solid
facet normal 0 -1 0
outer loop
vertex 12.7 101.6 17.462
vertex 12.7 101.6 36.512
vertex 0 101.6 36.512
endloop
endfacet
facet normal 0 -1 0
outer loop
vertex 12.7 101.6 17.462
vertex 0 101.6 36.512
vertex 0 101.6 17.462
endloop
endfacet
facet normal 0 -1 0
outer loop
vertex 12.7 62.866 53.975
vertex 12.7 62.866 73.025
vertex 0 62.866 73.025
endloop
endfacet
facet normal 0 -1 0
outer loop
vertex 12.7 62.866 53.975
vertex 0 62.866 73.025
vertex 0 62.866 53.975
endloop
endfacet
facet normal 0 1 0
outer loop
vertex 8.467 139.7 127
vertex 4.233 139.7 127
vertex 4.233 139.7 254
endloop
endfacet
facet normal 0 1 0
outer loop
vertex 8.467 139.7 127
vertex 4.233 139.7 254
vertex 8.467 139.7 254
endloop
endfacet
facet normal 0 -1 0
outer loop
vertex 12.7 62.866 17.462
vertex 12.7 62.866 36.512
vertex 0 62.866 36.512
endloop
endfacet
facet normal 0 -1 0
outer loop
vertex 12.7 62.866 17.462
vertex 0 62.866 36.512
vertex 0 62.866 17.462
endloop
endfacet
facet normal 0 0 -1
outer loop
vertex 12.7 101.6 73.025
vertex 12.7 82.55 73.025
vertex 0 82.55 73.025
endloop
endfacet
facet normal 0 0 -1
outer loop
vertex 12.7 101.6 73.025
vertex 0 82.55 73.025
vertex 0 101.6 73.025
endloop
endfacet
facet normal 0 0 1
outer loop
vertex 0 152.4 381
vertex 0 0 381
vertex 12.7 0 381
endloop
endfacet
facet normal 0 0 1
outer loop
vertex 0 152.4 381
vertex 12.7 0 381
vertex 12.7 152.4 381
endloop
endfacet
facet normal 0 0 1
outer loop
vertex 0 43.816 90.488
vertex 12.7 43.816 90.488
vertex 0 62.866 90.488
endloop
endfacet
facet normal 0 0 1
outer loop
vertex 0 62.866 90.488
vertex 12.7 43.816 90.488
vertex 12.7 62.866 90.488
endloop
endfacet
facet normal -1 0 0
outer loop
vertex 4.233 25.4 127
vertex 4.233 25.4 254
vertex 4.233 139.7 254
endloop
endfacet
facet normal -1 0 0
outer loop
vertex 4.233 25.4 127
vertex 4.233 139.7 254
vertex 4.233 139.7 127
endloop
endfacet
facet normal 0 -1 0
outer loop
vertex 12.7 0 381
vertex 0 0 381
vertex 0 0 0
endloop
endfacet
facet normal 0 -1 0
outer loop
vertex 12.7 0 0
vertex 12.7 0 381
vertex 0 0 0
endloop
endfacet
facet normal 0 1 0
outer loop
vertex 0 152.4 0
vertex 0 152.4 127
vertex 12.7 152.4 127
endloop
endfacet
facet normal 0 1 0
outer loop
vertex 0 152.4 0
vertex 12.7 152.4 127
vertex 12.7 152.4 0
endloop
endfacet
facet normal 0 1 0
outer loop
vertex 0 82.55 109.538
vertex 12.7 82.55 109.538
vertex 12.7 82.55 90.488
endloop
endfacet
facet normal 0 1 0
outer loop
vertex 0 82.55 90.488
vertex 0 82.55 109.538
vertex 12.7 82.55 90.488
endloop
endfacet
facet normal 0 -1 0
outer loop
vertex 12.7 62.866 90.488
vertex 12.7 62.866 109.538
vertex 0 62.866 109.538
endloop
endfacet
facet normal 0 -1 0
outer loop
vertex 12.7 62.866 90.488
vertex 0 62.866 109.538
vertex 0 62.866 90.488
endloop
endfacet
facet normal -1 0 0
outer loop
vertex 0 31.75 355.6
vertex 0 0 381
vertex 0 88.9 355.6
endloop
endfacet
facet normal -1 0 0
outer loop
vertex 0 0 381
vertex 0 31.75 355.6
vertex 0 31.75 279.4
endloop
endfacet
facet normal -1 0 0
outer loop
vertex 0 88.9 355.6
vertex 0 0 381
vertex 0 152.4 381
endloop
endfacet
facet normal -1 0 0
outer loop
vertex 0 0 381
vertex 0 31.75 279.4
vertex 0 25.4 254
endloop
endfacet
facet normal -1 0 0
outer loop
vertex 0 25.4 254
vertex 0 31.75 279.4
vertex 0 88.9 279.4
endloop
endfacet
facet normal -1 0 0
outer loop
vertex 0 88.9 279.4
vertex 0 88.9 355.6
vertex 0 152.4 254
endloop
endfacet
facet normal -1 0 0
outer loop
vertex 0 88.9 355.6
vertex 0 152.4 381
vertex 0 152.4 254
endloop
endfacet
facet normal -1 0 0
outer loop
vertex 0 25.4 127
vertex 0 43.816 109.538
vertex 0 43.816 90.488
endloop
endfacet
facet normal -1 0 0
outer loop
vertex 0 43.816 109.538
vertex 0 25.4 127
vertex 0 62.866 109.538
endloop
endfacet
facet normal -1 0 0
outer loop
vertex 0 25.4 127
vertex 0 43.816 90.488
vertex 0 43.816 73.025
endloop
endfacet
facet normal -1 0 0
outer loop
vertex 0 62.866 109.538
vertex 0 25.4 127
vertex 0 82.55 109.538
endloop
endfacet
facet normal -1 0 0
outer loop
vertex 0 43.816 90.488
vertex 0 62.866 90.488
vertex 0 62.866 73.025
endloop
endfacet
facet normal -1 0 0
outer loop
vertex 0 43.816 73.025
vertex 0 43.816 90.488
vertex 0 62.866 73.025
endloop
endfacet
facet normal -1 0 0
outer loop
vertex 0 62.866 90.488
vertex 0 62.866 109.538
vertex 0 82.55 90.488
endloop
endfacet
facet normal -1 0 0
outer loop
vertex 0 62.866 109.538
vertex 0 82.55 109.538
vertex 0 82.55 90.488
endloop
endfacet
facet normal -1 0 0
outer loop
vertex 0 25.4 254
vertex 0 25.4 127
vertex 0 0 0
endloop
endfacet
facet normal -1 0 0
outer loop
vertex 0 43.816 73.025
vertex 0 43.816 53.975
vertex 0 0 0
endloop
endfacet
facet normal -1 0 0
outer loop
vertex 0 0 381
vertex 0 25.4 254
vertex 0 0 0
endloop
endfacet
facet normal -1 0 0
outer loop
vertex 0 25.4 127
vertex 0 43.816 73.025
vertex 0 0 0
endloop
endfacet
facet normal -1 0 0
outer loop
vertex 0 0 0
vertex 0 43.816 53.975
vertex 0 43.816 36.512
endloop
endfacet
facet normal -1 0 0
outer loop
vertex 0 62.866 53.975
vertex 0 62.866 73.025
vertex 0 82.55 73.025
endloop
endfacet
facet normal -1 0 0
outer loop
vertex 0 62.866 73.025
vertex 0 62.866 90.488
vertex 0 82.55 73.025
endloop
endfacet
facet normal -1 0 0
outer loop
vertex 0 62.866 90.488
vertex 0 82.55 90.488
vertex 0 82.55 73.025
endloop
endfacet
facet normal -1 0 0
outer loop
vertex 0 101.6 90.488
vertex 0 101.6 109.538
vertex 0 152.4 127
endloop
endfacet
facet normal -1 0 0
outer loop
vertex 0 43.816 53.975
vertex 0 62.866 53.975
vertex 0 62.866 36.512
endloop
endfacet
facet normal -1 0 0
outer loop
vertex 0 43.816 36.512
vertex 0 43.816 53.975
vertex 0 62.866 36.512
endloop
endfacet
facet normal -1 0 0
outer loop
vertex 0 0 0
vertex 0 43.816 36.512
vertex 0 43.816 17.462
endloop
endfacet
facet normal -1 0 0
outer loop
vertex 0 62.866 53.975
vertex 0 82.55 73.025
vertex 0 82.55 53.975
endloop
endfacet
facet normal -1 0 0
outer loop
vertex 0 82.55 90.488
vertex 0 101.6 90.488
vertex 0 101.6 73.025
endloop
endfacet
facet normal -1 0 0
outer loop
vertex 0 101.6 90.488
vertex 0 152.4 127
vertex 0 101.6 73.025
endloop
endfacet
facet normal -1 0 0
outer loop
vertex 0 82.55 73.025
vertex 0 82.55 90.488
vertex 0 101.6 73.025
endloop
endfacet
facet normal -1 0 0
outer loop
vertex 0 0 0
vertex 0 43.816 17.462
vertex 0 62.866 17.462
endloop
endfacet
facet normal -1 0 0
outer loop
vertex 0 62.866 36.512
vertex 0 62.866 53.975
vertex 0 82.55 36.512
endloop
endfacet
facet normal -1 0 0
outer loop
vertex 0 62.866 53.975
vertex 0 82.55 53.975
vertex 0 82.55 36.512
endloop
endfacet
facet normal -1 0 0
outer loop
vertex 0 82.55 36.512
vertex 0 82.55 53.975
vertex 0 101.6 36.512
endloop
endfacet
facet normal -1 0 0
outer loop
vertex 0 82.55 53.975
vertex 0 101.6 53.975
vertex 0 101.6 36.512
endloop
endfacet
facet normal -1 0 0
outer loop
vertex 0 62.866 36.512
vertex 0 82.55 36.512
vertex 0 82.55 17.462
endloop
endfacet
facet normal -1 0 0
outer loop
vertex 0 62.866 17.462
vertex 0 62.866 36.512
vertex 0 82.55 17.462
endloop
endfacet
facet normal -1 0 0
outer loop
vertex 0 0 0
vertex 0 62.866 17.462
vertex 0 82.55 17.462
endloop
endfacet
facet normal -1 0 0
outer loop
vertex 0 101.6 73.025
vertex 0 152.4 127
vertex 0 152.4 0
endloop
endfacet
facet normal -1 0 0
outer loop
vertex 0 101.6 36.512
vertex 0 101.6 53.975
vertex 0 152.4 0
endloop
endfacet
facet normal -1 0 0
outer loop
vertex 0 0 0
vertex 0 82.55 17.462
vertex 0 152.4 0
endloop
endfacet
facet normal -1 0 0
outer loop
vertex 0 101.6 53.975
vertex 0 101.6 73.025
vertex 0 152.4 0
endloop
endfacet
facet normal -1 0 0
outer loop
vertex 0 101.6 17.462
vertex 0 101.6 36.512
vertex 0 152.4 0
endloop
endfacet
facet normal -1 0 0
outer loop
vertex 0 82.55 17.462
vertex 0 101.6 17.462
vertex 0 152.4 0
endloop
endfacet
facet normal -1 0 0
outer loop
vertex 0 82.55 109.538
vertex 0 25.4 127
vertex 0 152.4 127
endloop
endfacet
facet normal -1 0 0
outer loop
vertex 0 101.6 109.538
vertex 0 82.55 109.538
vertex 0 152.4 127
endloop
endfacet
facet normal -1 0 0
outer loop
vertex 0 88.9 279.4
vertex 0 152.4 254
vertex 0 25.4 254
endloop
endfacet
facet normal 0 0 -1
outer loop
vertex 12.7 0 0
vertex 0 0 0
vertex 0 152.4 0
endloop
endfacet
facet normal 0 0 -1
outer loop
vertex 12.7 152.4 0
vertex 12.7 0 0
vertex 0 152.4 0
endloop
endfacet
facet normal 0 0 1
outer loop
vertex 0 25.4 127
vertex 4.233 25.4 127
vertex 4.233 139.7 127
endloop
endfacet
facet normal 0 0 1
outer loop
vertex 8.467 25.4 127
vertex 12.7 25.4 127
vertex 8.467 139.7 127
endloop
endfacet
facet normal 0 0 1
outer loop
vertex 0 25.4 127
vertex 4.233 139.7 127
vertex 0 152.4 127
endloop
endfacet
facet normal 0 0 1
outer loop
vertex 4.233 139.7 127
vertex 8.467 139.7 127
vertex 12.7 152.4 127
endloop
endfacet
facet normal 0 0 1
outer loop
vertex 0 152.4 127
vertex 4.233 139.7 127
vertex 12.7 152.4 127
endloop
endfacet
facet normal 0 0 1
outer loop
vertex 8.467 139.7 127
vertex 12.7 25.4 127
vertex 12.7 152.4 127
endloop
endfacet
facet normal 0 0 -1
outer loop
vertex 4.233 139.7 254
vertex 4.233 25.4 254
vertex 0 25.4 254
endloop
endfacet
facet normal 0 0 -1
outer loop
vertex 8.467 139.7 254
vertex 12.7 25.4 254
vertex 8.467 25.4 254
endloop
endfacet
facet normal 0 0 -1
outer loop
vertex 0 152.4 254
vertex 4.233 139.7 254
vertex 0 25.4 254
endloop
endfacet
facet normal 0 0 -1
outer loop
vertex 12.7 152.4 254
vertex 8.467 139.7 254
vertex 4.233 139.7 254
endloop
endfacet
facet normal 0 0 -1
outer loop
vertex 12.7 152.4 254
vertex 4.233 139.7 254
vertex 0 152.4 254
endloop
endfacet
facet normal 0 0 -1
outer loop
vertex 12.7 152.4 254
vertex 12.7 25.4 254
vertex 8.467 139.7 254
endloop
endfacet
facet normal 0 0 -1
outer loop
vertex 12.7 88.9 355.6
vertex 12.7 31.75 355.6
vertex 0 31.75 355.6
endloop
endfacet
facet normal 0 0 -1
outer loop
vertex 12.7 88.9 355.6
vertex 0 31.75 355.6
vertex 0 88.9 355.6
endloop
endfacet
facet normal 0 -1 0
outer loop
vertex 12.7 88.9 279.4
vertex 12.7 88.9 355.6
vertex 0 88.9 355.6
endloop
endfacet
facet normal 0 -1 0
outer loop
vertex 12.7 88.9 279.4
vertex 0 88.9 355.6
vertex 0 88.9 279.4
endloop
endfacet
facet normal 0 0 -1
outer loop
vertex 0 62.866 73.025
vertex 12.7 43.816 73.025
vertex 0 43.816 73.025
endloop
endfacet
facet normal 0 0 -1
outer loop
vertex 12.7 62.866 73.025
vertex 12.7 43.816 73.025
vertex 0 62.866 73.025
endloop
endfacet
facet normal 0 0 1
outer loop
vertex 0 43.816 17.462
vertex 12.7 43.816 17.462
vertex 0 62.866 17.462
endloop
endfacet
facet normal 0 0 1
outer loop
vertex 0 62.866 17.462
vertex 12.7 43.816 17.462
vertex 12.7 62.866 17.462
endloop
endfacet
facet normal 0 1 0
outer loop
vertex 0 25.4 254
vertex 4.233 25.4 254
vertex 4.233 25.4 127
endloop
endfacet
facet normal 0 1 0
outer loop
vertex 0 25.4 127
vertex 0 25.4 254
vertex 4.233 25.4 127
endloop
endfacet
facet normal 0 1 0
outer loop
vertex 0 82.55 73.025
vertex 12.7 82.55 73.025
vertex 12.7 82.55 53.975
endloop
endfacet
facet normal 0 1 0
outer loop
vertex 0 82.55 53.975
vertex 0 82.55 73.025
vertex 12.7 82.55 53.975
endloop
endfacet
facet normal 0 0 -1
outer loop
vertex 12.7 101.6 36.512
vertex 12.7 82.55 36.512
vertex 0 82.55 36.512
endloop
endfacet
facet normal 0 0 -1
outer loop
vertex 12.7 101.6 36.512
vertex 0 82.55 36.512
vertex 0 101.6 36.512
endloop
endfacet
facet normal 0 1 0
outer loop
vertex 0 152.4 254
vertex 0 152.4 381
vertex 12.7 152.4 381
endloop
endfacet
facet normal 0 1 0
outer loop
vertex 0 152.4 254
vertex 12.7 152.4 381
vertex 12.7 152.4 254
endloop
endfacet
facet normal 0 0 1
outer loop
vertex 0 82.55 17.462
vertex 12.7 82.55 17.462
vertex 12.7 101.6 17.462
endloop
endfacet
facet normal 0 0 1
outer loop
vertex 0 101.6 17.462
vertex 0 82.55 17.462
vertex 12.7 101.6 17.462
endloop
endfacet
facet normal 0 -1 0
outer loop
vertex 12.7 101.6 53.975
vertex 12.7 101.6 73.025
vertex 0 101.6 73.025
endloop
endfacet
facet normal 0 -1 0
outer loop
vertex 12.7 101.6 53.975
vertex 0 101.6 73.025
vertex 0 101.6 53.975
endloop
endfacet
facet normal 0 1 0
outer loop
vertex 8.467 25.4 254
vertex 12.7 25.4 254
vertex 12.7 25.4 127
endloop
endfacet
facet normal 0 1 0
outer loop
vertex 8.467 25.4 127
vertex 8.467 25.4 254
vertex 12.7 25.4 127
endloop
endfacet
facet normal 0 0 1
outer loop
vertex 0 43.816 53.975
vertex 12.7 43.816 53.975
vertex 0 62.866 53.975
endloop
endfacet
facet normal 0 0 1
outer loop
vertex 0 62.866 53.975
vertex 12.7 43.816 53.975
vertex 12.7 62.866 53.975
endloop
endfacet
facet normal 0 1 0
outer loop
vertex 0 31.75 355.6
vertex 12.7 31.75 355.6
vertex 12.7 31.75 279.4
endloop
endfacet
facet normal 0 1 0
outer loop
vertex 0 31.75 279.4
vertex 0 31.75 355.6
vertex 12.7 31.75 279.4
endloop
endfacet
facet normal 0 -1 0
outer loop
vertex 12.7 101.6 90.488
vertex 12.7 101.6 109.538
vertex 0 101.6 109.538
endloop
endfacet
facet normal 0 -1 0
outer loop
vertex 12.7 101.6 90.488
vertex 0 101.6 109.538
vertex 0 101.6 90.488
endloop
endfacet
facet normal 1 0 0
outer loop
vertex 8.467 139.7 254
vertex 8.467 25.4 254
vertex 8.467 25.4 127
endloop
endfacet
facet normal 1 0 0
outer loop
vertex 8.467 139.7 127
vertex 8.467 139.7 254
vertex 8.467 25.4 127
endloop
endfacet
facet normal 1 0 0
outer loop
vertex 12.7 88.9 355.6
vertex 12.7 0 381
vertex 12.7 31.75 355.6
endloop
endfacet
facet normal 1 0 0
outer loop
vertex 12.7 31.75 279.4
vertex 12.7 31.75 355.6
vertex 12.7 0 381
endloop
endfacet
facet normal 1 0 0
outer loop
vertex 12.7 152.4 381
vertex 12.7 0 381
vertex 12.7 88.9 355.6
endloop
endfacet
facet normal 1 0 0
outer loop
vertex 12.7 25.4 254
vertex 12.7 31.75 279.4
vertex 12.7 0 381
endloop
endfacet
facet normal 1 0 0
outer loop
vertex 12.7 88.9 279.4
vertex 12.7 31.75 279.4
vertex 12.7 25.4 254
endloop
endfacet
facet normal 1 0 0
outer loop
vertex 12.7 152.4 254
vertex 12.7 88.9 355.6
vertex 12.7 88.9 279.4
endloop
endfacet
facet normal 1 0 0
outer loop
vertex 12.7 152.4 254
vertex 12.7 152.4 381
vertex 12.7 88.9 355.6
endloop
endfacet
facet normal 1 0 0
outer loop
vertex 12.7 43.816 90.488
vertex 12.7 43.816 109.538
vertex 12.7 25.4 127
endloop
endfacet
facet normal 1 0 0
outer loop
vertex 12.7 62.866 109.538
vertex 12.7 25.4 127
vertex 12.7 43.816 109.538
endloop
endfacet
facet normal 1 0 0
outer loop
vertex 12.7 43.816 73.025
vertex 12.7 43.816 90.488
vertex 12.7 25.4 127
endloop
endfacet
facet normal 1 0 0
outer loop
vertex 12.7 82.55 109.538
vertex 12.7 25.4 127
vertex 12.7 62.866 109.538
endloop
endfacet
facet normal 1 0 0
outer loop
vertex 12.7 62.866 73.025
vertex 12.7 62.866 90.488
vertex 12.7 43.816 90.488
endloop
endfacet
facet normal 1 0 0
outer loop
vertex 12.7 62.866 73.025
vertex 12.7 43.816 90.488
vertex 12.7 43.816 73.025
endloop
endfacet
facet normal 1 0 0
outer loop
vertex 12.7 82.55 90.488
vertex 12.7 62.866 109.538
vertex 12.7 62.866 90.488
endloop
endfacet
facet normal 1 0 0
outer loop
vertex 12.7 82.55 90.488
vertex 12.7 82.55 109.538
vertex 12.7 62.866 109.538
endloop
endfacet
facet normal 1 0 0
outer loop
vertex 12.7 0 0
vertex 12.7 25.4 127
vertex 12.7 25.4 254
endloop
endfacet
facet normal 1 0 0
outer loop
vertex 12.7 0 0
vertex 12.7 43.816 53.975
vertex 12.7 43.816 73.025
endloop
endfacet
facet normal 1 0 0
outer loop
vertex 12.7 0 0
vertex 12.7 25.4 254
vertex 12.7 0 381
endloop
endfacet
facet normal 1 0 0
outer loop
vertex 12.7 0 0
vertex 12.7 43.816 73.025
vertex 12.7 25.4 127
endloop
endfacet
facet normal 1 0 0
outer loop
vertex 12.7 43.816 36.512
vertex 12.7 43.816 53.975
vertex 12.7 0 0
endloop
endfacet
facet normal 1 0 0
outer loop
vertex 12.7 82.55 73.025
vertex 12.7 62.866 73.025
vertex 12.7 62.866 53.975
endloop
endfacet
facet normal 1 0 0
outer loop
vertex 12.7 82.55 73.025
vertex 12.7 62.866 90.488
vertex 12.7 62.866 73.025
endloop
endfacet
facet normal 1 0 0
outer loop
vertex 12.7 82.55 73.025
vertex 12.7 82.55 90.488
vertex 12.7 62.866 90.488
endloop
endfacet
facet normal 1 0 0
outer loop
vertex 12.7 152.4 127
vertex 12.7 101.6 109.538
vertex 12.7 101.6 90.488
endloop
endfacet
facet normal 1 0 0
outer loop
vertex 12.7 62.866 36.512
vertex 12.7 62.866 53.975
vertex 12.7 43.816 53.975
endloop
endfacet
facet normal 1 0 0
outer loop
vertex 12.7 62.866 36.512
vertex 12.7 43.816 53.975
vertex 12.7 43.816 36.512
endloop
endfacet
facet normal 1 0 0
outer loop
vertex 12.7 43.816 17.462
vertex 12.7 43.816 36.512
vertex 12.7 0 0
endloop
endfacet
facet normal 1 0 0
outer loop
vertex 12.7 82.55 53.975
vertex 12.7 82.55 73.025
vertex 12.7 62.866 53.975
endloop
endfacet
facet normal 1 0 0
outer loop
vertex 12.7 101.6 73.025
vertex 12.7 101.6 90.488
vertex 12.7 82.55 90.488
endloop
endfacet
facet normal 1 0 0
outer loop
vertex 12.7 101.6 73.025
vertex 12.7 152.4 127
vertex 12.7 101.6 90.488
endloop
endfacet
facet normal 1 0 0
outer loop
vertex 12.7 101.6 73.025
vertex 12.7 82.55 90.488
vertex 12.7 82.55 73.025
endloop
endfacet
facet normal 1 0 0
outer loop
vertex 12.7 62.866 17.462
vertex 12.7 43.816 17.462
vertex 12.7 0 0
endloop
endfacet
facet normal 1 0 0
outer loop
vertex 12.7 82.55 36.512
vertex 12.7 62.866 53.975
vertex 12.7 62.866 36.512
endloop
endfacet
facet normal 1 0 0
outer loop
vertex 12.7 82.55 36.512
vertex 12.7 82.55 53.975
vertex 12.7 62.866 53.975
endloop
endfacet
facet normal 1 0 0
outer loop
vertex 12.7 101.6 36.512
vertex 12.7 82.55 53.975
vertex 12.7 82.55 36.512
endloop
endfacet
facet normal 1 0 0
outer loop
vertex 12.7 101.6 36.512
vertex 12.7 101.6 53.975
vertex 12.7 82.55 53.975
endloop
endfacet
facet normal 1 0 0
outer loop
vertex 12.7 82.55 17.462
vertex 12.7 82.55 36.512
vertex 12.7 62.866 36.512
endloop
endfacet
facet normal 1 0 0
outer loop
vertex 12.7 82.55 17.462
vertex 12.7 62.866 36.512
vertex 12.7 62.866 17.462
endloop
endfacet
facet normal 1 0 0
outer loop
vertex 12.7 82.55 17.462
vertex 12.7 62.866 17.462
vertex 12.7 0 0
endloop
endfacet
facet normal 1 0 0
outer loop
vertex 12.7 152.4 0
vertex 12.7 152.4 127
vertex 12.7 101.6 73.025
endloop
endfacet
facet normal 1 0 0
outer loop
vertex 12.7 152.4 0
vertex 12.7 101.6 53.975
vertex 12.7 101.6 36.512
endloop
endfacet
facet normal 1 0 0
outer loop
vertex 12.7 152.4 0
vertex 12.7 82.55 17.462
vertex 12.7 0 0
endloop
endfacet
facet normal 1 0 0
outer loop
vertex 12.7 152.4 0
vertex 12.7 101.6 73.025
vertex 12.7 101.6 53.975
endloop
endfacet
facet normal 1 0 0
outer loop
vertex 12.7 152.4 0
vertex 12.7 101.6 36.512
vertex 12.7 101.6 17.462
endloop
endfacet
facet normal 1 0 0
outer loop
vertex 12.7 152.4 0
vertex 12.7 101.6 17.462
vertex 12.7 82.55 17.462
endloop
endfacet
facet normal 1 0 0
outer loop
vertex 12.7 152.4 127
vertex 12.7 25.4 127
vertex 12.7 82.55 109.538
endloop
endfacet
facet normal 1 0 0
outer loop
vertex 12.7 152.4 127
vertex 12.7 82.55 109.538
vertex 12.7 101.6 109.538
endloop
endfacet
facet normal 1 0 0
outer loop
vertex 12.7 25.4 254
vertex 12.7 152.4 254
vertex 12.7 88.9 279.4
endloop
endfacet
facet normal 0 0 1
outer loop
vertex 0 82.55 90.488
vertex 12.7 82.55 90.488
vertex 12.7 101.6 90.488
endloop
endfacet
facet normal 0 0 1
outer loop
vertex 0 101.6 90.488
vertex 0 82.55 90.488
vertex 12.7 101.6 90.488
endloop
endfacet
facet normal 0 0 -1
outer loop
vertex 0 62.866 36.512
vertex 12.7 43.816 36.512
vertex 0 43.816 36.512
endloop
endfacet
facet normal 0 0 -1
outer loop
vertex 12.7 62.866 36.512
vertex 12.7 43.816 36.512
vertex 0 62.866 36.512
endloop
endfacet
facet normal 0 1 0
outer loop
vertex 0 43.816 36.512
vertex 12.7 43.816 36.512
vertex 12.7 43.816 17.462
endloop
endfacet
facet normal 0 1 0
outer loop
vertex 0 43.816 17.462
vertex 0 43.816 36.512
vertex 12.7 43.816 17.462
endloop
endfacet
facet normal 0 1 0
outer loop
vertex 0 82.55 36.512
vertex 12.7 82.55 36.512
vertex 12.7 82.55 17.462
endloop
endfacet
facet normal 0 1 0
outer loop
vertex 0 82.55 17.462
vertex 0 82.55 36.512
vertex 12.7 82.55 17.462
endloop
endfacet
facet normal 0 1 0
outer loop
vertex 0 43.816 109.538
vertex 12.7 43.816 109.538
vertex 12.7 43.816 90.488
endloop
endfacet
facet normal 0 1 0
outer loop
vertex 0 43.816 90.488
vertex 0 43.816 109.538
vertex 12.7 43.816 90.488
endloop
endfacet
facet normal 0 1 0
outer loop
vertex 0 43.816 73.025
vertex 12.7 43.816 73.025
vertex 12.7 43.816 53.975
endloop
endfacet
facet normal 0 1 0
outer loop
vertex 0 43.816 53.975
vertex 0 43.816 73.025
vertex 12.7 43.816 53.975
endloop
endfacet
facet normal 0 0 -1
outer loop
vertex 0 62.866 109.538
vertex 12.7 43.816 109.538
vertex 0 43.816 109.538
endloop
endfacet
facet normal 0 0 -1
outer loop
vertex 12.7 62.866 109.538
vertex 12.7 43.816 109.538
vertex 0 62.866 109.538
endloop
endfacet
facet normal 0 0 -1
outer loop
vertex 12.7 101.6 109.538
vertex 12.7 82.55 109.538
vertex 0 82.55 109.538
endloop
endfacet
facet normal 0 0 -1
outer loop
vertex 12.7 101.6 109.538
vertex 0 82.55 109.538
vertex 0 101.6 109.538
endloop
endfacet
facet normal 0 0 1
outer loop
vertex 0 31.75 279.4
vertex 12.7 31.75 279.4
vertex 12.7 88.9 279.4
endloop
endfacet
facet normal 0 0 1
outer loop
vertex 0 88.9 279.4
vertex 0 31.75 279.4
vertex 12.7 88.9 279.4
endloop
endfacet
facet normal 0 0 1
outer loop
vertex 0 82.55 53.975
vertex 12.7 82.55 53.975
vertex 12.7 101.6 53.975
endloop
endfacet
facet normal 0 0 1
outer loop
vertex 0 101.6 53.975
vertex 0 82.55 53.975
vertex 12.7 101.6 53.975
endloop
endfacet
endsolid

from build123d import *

# Parameters (mm, degrees)
SKETCH1_W           = 381
SKETCH1_H           = 152.4
BOSS_EXTRUDE2_DEPTH = 12.7
SKETCH2_W           = 127
SKETCH2_H           = 127
CUT_EXTRUDE1_DEPTH  = 12.7
SKETCH3_W           = 19.05
SKETCH3_H           = 19.05
SKETCH3_W_2         = 76.2
SKETCH3_H_2         = 57.15
CUT_EXTRUDE2_DEPTH  = 12.7
SKETCH4_W           = 4.233333334
SKETCH4_H           = 127
BOSS_EXTRUDE3_DEPTH = 114.3


with BuildPart() as part:
    # Sketch1 → Boss-Extrude2 (new body)
    with BuildSketch(Plane(origin=(0, 0, 0), x_dir=(0, 0, -1), z_dir=(1, 0, 0))):
        with Locations((-190.5, 76.2)):
            Rectangle(SKETCH1_W, SKETCH1_H)
    extrude(amount=BOSS_EXTRUDE2_DEPTH)

    # Sketch2 → Cut-Extrude1 (cut)
    with BuildSketch(Plane(origin=(12.7, 0, 0), x_dir=(0, 0, -1), z_dir=(1, 0, 0))):
        with Locations((-190.5, 88.9)):
            Rectangle(SKETCH2_W, SKETCH2_H)
    extrude(amount=-CUT_EXTRUDE1_DEPTH, mode=Mode.SUBTRACT)

    # Sketch3 → Cut-Extrude2 (cut)
    with BuildSketch(Plane(origin=(12.7, 0, 0), x_dir=(0, 0, -1), z_dir=(1, 0, 0))):
        with Locations((-100.0125, 92.075)):
            Rectangle(SKETCH3_W, SKETCH3_H)
        with Locations((-63.5, 92.075)):
            Rectangle(SKETCH3_W, SKETCH3_H)
        with Locations((-26.9875, 92.075)):
            Rectangle(SKETCH3_W, SKETCH3_H)
        with Locations((-100.0125, 53.340985209)):
            Rectangle(SKETCH3_W, SKETCH3_H)
        with Locations((-63.5, 53.340985209)):
            Rectangle(SKETCH3_W, SKETCH3_H)
        with Locations((-26.9875, 53.340985209)):
            Rectangle(SKETCH3_W, SKETCH3_H)
        with Locations((-317.5, 60.325)):
            Rectangle(SKETCH3_W_2, SKETCH3_H_2)
    extrude(amount=-CUT_EXTRUDE2_DEPTH, mode=Mode.SUBTRACT)

    # Sketch4 → Boss-Extrude3 (add)
    with BuildSketch(Plane(origin=(0, 25.4, 0), x_dir=(1, 0, 0), z_dir=(0, 1, 0))):
        with Locations((6.35, -190.5)):
            Rectangle(SKETCH4_W, SKETCH4_H)
    extrude(amount=BOSS_EXTRUDE3_DEPTH)


solid = part.part
